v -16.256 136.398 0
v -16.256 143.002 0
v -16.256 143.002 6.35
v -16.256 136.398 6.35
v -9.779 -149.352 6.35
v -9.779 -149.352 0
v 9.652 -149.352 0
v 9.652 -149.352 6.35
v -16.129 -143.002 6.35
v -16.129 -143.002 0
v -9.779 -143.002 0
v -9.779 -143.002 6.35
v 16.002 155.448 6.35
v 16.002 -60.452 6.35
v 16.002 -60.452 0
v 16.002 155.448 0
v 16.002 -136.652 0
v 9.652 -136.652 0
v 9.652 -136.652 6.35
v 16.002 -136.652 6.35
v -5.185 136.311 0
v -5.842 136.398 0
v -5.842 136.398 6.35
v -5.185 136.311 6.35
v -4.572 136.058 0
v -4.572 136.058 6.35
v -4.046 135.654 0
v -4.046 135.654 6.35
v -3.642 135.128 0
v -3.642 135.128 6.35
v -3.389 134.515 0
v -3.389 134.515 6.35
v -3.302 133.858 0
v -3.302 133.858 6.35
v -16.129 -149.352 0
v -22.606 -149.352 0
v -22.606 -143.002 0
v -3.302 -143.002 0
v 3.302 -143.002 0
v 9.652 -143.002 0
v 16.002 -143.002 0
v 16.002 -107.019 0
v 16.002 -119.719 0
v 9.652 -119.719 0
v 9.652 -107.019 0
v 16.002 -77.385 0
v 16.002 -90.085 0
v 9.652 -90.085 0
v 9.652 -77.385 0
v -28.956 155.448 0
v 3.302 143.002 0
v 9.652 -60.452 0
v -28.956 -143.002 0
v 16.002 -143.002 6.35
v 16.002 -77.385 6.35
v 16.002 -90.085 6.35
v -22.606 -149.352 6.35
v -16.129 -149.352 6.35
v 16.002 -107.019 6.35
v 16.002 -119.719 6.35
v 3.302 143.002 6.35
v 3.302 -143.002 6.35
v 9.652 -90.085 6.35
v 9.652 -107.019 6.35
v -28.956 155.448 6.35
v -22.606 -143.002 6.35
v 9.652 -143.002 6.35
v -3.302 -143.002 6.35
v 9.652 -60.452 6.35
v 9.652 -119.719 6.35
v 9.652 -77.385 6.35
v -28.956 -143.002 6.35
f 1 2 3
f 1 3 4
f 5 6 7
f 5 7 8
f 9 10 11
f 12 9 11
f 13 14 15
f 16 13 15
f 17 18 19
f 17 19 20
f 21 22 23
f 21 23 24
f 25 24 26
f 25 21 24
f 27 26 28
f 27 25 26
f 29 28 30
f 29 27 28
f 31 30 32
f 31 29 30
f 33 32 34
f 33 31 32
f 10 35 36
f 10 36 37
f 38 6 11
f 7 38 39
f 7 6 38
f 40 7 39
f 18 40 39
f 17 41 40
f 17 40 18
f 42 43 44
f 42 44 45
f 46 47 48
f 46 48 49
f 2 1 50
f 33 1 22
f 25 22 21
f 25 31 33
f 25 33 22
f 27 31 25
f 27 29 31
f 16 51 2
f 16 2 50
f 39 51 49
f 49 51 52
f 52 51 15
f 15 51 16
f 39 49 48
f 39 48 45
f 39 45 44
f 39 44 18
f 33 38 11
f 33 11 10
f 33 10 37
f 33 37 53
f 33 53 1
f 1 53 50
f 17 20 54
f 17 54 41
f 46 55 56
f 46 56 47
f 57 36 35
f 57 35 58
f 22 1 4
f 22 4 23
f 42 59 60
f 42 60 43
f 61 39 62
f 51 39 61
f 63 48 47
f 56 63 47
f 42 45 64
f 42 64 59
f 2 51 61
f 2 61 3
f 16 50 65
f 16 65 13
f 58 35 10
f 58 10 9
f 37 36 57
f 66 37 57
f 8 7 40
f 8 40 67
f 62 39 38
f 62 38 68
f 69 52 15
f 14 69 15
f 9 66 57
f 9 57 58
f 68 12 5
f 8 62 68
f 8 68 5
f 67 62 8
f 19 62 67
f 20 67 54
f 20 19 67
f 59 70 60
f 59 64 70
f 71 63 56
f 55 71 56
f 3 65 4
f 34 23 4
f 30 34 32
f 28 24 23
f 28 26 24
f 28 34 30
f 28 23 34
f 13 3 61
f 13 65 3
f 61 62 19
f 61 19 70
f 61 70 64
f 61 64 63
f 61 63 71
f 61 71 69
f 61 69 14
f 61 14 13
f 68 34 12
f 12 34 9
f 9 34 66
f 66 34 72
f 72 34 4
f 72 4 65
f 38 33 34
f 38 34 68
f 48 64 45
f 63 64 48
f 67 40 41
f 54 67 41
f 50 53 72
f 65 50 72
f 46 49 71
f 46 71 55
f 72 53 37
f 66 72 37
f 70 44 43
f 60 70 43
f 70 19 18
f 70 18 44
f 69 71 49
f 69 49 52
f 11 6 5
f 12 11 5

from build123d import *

# Parameters (mm, degrees)
SKETCH1_W           = 44.958
SKETCH1_H           = 304.8
BOSS_EXTRUDE1_DEPTH = 6.35
SKETCH2_W           = 6.35
SKETCH2_H           = 101.6
BOSS_EXTRUDE2_DEPTH = 6.35
SKETCH3_W           = 222.25
SKETCH3_H           = 6.35
BOSS_EXTRUDE3_DEPTH = 38.608
SKETCH7_W           = 327.022738736
SKETCH7_H           = 279.435650021
CUT_EXTRUDE1_DEPTH  = 45.958
SKETCH4_W           = 6.35
SKETCH4_H           = 6.35
SKETCH4_H_2         = 12.7
CUT_EXTRUDE2_DEPTH  = 6.35
SKETCH6_W           = 6.35
SKETCH6_H           = 16.933333333
SKETCH6_H_2         = 16.933333334
CUT_EXTRUDE3_DEPTH  = 7.35


with BuildPart() as part:
    # Sketch1 → Boss-Extrude1 (new body)
    with BuildSketch(Plane.XY):
        with Locations((-6.477, 3.048)):
            Rectangle(SKETCH1_W, SKETCH1_H)
        with BuildLine():
            Line((-3.302, 133.858), (-3.302, -143.002))
            Line((-3.302, -143.002), (3.302, -143.002))
            Line((3.302, -143.002), (3.302, 143.002))
            Line((3.302, 143.002), (-16.256, 143.002))
            Line((-16.256, 143.002), (-16.256, 136.398))
            Line((-16.256, 136.398), (-5.842, 136.398))
            ThreePointArc((-5.842, 136.398), (-4.045948776, 135.654051224), (-3.302, 133.858))
        make_face(mode=Mode.SUBTRACT)
    extrude(amount=BOSS_EXTRUDE1_DEPTH)

    # Sketch2 → Boss-Extrude2 (add)
    with BuildSketch(Plane(origin=(16.002, 0, 0), x_dir=(0, 0, -1), z_dir=(1, 0, 0))):
        Polygon((222.25, -60.452), (222.25, -47.752), (0, -47.752), (0, -149.352), (222.25, -149.352), (222.25, -136.652), (228.6, -136.652), (228.6, -119.718666667), (222.25, -119.718666667), (222.25, -107.018666667), (228.6, -107.018666667), (228.6, -90.085333333), (222.25, -90.085333333), (222.25, -77.385333333), (228.6, -77.385333333), (228.6, -60.452), align=None)
        with BuildLine():
            ThreePointArc((11.4, -116.592), (9.9, -118.092), (8.4, -116.592))
            Line((8.4, -116.592), (8.4, -111.512))
            ThreePointArc((8.4, -111.512), (9.9, -110.012), (11.4, -111.512))
            Line((11.4, -111.512), (11.4, -116.592))
        make_face(mode=Mode.SUBTRACT)
        with BuildLine():
            Line((42.4, -111.512), (42.4, -116.592))
            ThreePointArc((42.4, -116.592), (40.9, -118.092), (39.4, -116.592))
            Line((39.4, -116.592), (39.4, -111.512))
            ThreePointArc((39.4, -111.512), (40.9, -110.012), (42.4, -111.512))
        make_face(mode=Mode.SUBTRACT)
        with BuildLine():
            ThreePointArc((36.4, -101.092), (25.4, -112.092), (14.4, -101.092))
            Line((14.4, -101.092), (14.4, -96.012))
            ThreePointArc((14.4, -96.012), (25.4, -85.012), (36.4, -96.012))
            Line((36.4, -96.012), (36.4, -101.092))
        make_face(mode=Mode.SUBTRACT)
        with BuildLine():
            ThreePointArc((11.4, -85.592), (9.9, -87.092), (8.4, -85.592))
            Line((8.4, -85.592), (8.4, -80.512))
            ThreePointArc((8.4, -80.512), (9.9, -79.012), (11.4, -80.512))
            Line((11.4, -80.512), (11.4, -85.592))
        make_face(mode=Mode.SUBTRACT)
        with BuildLine():
            ThreePointArc((42.4, -85.592), (40.9, -87.092), (39.4, -85.592))
            Line((39.4, -85.592), (39.4, -80.512))
            ThreePointArc((39.4, -80.512), (40.9, -79.012), (42.4, -80.512))
            Line((42.4, -80.512), (42.4, -85.592))
        make_face(mode=Mode.SUBTRACT)
        with Locations((-3.175, -98.552)):
            Rectangle(SKETCH2_W, SKETCH2_H)
    extrude(amount=-BOSS_EXTRUDE2_DEPTH)

    # Sketch3 → Boss-Extrude3 (add)
    with BuildSketch(Plane.ZY.offset(-9.652)):
        with Locations((-111.125, -146.177)):
            Rectangle(SKETCH3_W, SKETCH3_H)
    extrude(amount=BOSS_EXTRUDE3_DEPTH)

    # Sketch7 → Cut-Extrude1 (cut, through all)
    with BuildSketch(Plane(origin=(16.002, 0, 0), x_dir=(0, 0, -1), z_dir=(1, 0, 0))):
        with Locations((163.511369368, -148.348068682)):
            Rectangle(SKETCH7_W, SKETCH7_H)
    extrude(amount=-CUT_EXTRUDE1_DEPTH, mode=Mode.SUBTRACT)

    # Sketch4 → Cut-Extrude2 (cut)
    with BuildSketch(Plane.XZ.offset(149.352)):
        with Locations((-12.954, 3.175)):
            Rectangle(SKETCH4_W, SKETCH4_H)
        with Locations((12.827, 3.175)):
            Rectangle(SKETCH4_W, SKETCH4_H)
        with Locations((-25.781, 3.175)):
            Rectangle(SKETCH4_W, SKETCH4_H)
        with Locations((12.827, -134.9375)):
            Rectangle(SKETCH4_W, SKETCH4_H_2)
        with Locations((12.827, -53.975)):
            Rectangle(SKETCH4_W, SKETCH4_H_2)
        with Locations((12.827, -161.925)):
            Rectangle(SKETCH4_W, SKETCH4_H_2)
    extrude(amount=-CUT_EXTRUDE2_DEPTH, mode=Mode.SUBTRACT)

    # Sketch6 → Cut-Extrude3 (cut, through all)
    with BuildSketch(Plane.XY.offset(6.35)):
        with Locations((12.827, -68.918666667)):
            Rectangle(SKETCH6_W, SKETCH6_H)
        with Locations((12.827, -98.552)):
            Rectangle(SKETCH6_W, SKETCH6_H_2)
        with Locations((12.827, -128.185333334)):
            Rectangle(SKETCH6_W, SKETCH6_H)
    extrude(amount=-CUT_EXTRUDE3_DEPTH, mode=Mode.SUBTRACT)


solid = part.part
